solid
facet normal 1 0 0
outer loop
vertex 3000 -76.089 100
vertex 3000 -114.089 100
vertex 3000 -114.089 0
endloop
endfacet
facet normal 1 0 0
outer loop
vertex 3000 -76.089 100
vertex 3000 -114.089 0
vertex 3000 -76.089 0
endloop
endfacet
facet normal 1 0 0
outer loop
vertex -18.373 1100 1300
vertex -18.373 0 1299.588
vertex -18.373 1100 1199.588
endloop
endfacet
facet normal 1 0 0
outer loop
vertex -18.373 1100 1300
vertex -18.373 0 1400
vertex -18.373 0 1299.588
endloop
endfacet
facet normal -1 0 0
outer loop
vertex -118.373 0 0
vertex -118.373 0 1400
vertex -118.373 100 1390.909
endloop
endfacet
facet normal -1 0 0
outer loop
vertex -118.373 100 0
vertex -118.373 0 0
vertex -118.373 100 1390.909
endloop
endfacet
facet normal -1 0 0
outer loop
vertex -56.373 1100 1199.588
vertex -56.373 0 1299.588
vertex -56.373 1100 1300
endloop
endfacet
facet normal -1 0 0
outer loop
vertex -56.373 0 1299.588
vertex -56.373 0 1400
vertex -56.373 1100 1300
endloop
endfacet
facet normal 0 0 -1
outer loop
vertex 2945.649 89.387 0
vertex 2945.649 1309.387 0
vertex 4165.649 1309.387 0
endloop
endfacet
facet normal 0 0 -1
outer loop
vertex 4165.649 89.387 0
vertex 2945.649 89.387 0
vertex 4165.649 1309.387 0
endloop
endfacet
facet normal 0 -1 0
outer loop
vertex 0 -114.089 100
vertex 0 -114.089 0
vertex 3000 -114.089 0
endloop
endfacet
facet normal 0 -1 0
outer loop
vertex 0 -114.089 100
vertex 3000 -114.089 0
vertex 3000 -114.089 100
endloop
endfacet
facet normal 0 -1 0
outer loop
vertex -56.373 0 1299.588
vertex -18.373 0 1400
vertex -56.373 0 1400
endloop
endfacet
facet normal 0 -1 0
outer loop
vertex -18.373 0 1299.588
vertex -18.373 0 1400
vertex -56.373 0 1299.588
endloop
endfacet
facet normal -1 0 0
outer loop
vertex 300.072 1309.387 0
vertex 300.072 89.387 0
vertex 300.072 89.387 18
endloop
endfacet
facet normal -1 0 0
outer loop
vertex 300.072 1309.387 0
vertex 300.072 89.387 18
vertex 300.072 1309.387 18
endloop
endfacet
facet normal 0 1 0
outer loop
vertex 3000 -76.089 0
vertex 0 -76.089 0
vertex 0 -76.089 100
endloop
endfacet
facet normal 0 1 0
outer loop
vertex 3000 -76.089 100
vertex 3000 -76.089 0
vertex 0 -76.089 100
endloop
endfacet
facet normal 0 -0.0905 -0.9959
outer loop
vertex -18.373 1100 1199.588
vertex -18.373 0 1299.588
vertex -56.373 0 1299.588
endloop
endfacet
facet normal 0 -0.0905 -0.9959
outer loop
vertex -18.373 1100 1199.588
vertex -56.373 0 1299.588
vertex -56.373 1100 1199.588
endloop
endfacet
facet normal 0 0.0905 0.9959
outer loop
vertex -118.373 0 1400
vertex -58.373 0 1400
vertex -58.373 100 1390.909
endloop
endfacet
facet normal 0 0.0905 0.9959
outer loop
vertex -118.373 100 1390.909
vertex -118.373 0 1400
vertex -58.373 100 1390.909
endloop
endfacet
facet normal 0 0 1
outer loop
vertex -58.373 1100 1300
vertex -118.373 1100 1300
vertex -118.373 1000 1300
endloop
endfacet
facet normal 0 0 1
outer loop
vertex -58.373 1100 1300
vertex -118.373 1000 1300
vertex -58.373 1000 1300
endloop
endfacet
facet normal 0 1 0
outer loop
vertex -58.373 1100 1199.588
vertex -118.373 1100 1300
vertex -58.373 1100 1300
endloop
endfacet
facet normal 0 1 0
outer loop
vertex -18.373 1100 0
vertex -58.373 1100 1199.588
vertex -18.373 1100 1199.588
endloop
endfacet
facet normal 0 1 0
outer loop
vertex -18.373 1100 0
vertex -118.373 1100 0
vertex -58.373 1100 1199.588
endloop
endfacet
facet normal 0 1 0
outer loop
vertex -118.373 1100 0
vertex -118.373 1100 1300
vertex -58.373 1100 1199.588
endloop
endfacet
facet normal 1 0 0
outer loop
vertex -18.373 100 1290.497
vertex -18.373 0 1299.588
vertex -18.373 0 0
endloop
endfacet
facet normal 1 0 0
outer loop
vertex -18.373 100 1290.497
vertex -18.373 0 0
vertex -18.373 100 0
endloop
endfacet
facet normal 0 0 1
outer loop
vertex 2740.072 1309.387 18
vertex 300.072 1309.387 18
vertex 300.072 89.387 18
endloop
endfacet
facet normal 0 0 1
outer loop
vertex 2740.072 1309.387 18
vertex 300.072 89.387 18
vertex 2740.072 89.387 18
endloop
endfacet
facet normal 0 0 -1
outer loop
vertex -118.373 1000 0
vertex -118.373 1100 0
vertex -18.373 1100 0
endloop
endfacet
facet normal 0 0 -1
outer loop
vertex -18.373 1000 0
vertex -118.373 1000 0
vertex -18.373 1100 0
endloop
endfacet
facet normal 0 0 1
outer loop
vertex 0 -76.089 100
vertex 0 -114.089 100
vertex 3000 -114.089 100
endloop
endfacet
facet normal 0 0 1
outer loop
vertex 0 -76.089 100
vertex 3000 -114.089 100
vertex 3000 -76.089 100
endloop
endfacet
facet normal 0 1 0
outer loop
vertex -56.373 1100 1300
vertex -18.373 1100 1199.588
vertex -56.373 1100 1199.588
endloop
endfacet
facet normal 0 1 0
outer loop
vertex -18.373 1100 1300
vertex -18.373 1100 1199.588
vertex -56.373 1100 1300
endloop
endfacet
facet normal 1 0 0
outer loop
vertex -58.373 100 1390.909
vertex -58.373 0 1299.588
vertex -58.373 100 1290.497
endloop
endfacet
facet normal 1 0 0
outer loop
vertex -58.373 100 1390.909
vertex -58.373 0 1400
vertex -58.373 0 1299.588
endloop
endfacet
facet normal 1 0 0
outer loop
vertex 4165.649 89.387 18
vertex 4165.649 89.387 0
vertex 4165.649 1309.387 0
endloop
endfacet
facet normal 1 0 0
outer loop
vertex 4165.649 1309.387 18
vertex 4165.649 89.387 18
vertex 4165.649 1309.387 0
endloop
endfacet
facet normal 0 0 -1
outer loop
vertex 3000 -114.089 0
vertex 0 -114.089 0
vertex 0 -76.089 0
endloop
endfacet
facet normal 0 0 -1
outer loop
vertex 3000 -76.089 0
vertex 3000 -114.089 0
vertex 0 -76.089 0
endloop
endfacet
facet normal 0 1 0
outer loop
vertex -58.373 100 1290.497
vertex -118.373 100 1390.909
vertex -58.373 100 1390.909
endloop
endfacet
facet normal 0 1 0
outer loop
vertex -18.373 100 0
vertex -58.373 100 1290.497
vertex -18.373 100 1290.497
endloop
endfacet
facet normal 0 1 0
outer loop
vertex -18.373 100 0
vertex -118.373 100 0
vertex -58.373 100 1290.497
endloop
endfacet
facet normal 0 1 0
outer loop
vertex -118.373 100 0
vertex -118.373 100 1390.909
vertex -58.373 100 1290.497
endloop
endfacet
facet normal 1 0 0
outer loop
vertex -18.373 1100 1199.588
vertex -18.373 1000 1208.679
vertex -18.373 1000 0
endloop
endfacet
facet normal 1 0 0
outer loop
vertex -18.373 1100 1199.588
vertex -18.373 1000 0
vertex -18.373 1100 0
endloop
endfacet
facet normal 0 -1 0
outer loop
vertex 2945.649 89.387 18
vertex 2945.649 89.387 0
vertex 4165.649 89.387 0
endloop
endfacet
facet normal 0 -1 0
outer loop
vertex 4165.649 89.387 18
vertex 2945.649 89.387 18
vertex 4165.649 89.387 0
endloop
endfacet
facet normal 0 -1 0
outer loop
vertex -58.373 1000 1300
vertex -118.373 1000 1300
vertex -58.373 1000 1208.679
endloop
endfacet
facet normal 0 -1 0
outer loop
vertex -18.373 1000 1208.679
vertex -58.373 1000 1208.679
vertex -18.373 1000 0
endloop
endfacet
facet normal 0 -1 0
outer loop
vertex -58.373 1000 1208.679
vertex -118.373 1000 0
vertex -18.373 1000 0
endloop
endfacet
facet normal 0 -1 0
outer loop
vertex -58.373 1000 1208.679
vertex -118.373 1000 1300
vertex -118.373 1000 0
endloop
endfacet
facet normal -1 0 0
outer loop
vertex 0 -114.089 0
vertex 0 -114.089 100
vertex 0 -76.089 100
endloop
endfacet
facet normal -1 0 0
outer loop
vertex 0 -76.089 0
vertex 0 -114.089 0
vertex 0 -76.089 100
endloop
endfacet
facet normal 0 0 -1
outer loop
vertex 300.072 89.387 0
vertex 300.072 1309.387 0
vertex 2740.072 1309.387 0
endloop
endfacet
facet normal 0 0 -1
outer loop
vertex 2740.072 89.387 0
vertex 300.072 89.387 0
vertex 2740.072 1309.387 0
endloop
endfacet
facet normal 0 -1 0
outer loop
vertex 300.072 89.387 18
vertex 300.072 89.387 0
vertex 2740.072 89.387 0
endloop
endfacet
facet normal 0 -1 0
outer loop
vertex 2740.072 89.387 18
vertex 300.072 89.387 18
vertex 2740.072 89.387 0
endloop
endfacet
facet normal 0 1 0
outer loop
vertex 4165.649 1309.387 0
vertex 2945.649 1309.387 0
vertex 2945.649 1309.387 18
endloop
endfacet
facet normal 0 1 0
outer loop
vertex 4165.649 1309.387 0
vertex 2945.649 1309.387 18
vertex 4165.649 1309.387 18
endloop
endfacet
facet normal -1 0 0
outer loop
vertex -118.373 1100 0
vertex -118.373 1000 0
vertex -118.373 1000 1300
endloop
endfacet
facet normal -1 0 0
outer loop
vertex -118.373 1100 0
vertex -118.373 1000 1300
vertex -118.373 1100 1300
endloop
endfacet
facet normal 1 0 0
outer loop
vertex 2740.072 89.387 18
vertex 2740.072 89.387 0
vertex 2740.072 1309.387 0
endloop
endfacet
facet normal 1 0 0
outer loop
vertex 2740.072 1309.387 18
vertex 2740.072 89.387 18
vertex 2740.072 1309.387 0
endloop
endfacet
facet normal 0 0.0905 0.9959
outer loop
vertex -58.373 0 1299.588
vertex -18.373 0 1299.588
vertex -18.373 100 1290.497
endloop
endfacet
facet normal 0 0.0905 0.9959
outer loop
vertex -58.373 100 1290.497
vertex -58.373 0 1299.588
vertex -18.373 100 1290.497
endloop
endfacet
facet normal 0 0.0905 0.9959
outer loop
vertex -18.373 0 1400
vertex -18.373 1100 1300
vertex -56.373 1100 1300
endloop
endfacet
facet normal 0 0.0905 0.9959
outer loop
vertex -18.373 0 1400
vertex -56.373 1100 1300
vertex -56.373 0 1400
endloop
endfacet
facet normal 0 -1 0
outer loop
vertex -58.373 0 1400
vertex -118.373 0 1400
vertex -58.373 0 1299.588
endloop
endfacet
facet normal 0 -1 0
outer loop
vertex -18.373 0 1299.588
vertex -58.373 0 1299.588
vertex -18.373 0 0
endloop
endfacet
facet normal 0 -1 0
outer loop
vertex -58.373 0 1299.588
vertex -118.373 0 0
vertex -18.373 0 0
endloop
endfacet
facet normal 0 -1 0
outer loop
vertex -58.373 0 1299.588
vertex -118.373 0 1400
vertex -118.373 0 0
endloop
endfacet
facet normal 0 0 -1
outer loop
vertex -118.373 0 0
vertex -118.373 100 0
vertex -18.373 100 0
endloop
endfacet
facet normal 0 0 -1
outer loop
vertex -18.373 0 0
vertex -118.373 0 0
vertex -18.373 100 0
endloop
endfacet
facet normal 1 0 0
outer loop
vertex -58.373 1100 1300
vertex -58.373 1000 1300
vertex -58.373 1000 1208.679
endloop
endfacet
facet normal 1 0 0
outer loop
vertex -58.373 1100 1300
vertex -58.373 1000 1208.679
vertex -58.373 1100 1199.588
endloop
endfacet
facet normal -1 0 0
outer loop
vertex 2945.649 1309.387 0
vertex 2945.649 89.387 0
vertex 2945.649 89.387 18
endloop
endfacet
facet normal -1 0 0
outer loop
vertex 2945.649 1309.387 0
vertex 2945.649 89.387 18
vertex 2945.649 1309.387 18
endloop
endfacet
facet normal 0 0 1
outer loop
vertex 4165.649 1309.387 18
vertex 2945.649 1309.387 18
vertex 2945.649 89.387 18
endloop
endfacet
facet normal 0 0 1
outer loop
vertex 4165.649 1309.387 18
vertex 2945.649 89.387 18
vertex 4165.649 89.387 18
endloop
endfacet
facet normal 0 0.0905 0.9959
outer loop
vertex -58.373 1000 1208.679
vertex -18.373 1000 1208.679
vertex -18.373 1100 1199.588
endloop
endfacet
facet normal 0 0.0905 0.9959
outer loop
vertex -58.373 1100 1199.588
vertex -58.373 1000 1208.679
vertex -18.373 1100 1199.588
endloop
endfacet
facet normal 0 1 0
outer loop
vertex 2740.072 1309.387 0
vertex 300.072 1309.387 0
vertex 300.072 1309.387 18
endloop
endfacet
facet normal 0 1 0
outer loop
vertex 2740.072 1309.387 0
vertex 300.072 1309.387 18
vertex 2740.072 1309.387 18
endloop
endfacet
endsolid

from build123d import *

# Parameters (mm, degrees)
F0_W      = 100
F0_H      = 100
F1_DEPTH  = 1400
F2_DEPTH  = 1300
F3_W      = 38
F3_H      = 100
F4_DEPTH  = 3000
F5_W      = 2440
F5_H      = 1220
F6_DEPTH  = 18
F5_W_2    = 1220
F8_DEPTH  = 100
F9_DEPTH  = 40
F10_DEPTH = 38


# Not quite as in the source:
# - a feature names something its author has since deleted; it is built from what else it names


with BuildPart() as f1:
    # F0 (on Top) → F1 (new body)
    with BuildSketch(Plane.XY):
        with Locations((-68.3726489544, 50)):
            Rectangle(F0_W, F0_H)
    extrude(amount=F1_DEPTH)

    # F7 (on face) → F8 (cut, through all)
    with BuildSketch(Plane.YZ.offset(-18.3726489544)):
        Polygon((0, 1400), (100, 1390.9090909091), (100, 1400), align=None)
    extrude(amount=-F8_DEPTH, mode=Mode.SUBTRACT)


with BuildPart() as f2:
    # F0 (on Top) → F2 (new body)
    with BuildSketch(Plane.XY):
        with Locations((-68.3726489544, 1050)):
            Rectangle(F0_W, F0_H)
    extrude(amount=F2_DEPTH)


with BuildPart() as f4:
    # F3 (on Right) → F4 (new body)
    with BuildSketch(Plane.YZ):
        with Locations((-95.0890891392, 50)):
            Rectangle(F3_W, F3_H)
    extrude(amount=F4_DEPTH)


with BuildPart() as f6:
    # F5 (on Top) → F6 (new body)
    with BuildSketch(Plane.XY):
        with Locations((1520.0716269016, 699.3870592117)):
            Rectangle(F5_W, F5_H)
    extrude(amount=F6_DEPTH)


with BuildPart() as f6b:
    # F5 (on Top) → F6, piece 2 (new body)
    with BuildSketch(Plane.XY):
        with Locations((3555.6486701965, 699.3870592117)):
            Rectangle(F5_W_2, F5_H)
    extrude(amount=F6_DEPTH)


with BuildPart() as f9_tool:
    # F7 (on face) → F9 (new body)
    with BuildSketch(Plane.YZ.offset(-18.3726489544)):
        Polygon((0, 1299.5876271165), (100, 1290.4967180256), (100, 1390.9090909091), (0, 1400), align=None)
        Polygon((1000, 1300), (1000, 1208.6785362074), (1100, 1199.5876271165), (1100, 1300), align=None)
    extrude(amount=-F9_DEPTH)


with BuildPart() as f1_1:
    add(f1.part)

    # F9: cut by f9_tool
    add(f9_tool.part, mode=Mode.SUBTRACT)


with BuildPart() as f2_1:
    add(f2.part)

    # F9: cut by f9_tool
    add(f9_tool.part, mode=Mode.SUBTRACT)


with BuildPart() as f10:
    # F7 (on face) → F10 (new body)
    with BuildSketch(Plane.YZ.offset(-18.3726489544)):
        Polygon((0, 1299.5876271165), (100, 1290.4967180256), (100, 1390.9090909091), (0, 1400), align=None)
        Polygon((1000, 1309.0909090909), (1000, 1300), (1100, 1300), align=None)
        Polygon((1000, 1300), (1000, 1208.6785362074), (1100, 1199.5876271165), (1100, 1300), align=None)
        Polygon((100, 1290.4967180256), (1000, 1208.6785362074), (1000, 1300), (1000, 1309.0909090909), (100, 1390.9090909091), align=None)
    extrude(amount=-F10_DEPTH)


solid = Compound([f4.part, f6.part, f6b.part, f1_1.part, f2_1.part, f10.part])
